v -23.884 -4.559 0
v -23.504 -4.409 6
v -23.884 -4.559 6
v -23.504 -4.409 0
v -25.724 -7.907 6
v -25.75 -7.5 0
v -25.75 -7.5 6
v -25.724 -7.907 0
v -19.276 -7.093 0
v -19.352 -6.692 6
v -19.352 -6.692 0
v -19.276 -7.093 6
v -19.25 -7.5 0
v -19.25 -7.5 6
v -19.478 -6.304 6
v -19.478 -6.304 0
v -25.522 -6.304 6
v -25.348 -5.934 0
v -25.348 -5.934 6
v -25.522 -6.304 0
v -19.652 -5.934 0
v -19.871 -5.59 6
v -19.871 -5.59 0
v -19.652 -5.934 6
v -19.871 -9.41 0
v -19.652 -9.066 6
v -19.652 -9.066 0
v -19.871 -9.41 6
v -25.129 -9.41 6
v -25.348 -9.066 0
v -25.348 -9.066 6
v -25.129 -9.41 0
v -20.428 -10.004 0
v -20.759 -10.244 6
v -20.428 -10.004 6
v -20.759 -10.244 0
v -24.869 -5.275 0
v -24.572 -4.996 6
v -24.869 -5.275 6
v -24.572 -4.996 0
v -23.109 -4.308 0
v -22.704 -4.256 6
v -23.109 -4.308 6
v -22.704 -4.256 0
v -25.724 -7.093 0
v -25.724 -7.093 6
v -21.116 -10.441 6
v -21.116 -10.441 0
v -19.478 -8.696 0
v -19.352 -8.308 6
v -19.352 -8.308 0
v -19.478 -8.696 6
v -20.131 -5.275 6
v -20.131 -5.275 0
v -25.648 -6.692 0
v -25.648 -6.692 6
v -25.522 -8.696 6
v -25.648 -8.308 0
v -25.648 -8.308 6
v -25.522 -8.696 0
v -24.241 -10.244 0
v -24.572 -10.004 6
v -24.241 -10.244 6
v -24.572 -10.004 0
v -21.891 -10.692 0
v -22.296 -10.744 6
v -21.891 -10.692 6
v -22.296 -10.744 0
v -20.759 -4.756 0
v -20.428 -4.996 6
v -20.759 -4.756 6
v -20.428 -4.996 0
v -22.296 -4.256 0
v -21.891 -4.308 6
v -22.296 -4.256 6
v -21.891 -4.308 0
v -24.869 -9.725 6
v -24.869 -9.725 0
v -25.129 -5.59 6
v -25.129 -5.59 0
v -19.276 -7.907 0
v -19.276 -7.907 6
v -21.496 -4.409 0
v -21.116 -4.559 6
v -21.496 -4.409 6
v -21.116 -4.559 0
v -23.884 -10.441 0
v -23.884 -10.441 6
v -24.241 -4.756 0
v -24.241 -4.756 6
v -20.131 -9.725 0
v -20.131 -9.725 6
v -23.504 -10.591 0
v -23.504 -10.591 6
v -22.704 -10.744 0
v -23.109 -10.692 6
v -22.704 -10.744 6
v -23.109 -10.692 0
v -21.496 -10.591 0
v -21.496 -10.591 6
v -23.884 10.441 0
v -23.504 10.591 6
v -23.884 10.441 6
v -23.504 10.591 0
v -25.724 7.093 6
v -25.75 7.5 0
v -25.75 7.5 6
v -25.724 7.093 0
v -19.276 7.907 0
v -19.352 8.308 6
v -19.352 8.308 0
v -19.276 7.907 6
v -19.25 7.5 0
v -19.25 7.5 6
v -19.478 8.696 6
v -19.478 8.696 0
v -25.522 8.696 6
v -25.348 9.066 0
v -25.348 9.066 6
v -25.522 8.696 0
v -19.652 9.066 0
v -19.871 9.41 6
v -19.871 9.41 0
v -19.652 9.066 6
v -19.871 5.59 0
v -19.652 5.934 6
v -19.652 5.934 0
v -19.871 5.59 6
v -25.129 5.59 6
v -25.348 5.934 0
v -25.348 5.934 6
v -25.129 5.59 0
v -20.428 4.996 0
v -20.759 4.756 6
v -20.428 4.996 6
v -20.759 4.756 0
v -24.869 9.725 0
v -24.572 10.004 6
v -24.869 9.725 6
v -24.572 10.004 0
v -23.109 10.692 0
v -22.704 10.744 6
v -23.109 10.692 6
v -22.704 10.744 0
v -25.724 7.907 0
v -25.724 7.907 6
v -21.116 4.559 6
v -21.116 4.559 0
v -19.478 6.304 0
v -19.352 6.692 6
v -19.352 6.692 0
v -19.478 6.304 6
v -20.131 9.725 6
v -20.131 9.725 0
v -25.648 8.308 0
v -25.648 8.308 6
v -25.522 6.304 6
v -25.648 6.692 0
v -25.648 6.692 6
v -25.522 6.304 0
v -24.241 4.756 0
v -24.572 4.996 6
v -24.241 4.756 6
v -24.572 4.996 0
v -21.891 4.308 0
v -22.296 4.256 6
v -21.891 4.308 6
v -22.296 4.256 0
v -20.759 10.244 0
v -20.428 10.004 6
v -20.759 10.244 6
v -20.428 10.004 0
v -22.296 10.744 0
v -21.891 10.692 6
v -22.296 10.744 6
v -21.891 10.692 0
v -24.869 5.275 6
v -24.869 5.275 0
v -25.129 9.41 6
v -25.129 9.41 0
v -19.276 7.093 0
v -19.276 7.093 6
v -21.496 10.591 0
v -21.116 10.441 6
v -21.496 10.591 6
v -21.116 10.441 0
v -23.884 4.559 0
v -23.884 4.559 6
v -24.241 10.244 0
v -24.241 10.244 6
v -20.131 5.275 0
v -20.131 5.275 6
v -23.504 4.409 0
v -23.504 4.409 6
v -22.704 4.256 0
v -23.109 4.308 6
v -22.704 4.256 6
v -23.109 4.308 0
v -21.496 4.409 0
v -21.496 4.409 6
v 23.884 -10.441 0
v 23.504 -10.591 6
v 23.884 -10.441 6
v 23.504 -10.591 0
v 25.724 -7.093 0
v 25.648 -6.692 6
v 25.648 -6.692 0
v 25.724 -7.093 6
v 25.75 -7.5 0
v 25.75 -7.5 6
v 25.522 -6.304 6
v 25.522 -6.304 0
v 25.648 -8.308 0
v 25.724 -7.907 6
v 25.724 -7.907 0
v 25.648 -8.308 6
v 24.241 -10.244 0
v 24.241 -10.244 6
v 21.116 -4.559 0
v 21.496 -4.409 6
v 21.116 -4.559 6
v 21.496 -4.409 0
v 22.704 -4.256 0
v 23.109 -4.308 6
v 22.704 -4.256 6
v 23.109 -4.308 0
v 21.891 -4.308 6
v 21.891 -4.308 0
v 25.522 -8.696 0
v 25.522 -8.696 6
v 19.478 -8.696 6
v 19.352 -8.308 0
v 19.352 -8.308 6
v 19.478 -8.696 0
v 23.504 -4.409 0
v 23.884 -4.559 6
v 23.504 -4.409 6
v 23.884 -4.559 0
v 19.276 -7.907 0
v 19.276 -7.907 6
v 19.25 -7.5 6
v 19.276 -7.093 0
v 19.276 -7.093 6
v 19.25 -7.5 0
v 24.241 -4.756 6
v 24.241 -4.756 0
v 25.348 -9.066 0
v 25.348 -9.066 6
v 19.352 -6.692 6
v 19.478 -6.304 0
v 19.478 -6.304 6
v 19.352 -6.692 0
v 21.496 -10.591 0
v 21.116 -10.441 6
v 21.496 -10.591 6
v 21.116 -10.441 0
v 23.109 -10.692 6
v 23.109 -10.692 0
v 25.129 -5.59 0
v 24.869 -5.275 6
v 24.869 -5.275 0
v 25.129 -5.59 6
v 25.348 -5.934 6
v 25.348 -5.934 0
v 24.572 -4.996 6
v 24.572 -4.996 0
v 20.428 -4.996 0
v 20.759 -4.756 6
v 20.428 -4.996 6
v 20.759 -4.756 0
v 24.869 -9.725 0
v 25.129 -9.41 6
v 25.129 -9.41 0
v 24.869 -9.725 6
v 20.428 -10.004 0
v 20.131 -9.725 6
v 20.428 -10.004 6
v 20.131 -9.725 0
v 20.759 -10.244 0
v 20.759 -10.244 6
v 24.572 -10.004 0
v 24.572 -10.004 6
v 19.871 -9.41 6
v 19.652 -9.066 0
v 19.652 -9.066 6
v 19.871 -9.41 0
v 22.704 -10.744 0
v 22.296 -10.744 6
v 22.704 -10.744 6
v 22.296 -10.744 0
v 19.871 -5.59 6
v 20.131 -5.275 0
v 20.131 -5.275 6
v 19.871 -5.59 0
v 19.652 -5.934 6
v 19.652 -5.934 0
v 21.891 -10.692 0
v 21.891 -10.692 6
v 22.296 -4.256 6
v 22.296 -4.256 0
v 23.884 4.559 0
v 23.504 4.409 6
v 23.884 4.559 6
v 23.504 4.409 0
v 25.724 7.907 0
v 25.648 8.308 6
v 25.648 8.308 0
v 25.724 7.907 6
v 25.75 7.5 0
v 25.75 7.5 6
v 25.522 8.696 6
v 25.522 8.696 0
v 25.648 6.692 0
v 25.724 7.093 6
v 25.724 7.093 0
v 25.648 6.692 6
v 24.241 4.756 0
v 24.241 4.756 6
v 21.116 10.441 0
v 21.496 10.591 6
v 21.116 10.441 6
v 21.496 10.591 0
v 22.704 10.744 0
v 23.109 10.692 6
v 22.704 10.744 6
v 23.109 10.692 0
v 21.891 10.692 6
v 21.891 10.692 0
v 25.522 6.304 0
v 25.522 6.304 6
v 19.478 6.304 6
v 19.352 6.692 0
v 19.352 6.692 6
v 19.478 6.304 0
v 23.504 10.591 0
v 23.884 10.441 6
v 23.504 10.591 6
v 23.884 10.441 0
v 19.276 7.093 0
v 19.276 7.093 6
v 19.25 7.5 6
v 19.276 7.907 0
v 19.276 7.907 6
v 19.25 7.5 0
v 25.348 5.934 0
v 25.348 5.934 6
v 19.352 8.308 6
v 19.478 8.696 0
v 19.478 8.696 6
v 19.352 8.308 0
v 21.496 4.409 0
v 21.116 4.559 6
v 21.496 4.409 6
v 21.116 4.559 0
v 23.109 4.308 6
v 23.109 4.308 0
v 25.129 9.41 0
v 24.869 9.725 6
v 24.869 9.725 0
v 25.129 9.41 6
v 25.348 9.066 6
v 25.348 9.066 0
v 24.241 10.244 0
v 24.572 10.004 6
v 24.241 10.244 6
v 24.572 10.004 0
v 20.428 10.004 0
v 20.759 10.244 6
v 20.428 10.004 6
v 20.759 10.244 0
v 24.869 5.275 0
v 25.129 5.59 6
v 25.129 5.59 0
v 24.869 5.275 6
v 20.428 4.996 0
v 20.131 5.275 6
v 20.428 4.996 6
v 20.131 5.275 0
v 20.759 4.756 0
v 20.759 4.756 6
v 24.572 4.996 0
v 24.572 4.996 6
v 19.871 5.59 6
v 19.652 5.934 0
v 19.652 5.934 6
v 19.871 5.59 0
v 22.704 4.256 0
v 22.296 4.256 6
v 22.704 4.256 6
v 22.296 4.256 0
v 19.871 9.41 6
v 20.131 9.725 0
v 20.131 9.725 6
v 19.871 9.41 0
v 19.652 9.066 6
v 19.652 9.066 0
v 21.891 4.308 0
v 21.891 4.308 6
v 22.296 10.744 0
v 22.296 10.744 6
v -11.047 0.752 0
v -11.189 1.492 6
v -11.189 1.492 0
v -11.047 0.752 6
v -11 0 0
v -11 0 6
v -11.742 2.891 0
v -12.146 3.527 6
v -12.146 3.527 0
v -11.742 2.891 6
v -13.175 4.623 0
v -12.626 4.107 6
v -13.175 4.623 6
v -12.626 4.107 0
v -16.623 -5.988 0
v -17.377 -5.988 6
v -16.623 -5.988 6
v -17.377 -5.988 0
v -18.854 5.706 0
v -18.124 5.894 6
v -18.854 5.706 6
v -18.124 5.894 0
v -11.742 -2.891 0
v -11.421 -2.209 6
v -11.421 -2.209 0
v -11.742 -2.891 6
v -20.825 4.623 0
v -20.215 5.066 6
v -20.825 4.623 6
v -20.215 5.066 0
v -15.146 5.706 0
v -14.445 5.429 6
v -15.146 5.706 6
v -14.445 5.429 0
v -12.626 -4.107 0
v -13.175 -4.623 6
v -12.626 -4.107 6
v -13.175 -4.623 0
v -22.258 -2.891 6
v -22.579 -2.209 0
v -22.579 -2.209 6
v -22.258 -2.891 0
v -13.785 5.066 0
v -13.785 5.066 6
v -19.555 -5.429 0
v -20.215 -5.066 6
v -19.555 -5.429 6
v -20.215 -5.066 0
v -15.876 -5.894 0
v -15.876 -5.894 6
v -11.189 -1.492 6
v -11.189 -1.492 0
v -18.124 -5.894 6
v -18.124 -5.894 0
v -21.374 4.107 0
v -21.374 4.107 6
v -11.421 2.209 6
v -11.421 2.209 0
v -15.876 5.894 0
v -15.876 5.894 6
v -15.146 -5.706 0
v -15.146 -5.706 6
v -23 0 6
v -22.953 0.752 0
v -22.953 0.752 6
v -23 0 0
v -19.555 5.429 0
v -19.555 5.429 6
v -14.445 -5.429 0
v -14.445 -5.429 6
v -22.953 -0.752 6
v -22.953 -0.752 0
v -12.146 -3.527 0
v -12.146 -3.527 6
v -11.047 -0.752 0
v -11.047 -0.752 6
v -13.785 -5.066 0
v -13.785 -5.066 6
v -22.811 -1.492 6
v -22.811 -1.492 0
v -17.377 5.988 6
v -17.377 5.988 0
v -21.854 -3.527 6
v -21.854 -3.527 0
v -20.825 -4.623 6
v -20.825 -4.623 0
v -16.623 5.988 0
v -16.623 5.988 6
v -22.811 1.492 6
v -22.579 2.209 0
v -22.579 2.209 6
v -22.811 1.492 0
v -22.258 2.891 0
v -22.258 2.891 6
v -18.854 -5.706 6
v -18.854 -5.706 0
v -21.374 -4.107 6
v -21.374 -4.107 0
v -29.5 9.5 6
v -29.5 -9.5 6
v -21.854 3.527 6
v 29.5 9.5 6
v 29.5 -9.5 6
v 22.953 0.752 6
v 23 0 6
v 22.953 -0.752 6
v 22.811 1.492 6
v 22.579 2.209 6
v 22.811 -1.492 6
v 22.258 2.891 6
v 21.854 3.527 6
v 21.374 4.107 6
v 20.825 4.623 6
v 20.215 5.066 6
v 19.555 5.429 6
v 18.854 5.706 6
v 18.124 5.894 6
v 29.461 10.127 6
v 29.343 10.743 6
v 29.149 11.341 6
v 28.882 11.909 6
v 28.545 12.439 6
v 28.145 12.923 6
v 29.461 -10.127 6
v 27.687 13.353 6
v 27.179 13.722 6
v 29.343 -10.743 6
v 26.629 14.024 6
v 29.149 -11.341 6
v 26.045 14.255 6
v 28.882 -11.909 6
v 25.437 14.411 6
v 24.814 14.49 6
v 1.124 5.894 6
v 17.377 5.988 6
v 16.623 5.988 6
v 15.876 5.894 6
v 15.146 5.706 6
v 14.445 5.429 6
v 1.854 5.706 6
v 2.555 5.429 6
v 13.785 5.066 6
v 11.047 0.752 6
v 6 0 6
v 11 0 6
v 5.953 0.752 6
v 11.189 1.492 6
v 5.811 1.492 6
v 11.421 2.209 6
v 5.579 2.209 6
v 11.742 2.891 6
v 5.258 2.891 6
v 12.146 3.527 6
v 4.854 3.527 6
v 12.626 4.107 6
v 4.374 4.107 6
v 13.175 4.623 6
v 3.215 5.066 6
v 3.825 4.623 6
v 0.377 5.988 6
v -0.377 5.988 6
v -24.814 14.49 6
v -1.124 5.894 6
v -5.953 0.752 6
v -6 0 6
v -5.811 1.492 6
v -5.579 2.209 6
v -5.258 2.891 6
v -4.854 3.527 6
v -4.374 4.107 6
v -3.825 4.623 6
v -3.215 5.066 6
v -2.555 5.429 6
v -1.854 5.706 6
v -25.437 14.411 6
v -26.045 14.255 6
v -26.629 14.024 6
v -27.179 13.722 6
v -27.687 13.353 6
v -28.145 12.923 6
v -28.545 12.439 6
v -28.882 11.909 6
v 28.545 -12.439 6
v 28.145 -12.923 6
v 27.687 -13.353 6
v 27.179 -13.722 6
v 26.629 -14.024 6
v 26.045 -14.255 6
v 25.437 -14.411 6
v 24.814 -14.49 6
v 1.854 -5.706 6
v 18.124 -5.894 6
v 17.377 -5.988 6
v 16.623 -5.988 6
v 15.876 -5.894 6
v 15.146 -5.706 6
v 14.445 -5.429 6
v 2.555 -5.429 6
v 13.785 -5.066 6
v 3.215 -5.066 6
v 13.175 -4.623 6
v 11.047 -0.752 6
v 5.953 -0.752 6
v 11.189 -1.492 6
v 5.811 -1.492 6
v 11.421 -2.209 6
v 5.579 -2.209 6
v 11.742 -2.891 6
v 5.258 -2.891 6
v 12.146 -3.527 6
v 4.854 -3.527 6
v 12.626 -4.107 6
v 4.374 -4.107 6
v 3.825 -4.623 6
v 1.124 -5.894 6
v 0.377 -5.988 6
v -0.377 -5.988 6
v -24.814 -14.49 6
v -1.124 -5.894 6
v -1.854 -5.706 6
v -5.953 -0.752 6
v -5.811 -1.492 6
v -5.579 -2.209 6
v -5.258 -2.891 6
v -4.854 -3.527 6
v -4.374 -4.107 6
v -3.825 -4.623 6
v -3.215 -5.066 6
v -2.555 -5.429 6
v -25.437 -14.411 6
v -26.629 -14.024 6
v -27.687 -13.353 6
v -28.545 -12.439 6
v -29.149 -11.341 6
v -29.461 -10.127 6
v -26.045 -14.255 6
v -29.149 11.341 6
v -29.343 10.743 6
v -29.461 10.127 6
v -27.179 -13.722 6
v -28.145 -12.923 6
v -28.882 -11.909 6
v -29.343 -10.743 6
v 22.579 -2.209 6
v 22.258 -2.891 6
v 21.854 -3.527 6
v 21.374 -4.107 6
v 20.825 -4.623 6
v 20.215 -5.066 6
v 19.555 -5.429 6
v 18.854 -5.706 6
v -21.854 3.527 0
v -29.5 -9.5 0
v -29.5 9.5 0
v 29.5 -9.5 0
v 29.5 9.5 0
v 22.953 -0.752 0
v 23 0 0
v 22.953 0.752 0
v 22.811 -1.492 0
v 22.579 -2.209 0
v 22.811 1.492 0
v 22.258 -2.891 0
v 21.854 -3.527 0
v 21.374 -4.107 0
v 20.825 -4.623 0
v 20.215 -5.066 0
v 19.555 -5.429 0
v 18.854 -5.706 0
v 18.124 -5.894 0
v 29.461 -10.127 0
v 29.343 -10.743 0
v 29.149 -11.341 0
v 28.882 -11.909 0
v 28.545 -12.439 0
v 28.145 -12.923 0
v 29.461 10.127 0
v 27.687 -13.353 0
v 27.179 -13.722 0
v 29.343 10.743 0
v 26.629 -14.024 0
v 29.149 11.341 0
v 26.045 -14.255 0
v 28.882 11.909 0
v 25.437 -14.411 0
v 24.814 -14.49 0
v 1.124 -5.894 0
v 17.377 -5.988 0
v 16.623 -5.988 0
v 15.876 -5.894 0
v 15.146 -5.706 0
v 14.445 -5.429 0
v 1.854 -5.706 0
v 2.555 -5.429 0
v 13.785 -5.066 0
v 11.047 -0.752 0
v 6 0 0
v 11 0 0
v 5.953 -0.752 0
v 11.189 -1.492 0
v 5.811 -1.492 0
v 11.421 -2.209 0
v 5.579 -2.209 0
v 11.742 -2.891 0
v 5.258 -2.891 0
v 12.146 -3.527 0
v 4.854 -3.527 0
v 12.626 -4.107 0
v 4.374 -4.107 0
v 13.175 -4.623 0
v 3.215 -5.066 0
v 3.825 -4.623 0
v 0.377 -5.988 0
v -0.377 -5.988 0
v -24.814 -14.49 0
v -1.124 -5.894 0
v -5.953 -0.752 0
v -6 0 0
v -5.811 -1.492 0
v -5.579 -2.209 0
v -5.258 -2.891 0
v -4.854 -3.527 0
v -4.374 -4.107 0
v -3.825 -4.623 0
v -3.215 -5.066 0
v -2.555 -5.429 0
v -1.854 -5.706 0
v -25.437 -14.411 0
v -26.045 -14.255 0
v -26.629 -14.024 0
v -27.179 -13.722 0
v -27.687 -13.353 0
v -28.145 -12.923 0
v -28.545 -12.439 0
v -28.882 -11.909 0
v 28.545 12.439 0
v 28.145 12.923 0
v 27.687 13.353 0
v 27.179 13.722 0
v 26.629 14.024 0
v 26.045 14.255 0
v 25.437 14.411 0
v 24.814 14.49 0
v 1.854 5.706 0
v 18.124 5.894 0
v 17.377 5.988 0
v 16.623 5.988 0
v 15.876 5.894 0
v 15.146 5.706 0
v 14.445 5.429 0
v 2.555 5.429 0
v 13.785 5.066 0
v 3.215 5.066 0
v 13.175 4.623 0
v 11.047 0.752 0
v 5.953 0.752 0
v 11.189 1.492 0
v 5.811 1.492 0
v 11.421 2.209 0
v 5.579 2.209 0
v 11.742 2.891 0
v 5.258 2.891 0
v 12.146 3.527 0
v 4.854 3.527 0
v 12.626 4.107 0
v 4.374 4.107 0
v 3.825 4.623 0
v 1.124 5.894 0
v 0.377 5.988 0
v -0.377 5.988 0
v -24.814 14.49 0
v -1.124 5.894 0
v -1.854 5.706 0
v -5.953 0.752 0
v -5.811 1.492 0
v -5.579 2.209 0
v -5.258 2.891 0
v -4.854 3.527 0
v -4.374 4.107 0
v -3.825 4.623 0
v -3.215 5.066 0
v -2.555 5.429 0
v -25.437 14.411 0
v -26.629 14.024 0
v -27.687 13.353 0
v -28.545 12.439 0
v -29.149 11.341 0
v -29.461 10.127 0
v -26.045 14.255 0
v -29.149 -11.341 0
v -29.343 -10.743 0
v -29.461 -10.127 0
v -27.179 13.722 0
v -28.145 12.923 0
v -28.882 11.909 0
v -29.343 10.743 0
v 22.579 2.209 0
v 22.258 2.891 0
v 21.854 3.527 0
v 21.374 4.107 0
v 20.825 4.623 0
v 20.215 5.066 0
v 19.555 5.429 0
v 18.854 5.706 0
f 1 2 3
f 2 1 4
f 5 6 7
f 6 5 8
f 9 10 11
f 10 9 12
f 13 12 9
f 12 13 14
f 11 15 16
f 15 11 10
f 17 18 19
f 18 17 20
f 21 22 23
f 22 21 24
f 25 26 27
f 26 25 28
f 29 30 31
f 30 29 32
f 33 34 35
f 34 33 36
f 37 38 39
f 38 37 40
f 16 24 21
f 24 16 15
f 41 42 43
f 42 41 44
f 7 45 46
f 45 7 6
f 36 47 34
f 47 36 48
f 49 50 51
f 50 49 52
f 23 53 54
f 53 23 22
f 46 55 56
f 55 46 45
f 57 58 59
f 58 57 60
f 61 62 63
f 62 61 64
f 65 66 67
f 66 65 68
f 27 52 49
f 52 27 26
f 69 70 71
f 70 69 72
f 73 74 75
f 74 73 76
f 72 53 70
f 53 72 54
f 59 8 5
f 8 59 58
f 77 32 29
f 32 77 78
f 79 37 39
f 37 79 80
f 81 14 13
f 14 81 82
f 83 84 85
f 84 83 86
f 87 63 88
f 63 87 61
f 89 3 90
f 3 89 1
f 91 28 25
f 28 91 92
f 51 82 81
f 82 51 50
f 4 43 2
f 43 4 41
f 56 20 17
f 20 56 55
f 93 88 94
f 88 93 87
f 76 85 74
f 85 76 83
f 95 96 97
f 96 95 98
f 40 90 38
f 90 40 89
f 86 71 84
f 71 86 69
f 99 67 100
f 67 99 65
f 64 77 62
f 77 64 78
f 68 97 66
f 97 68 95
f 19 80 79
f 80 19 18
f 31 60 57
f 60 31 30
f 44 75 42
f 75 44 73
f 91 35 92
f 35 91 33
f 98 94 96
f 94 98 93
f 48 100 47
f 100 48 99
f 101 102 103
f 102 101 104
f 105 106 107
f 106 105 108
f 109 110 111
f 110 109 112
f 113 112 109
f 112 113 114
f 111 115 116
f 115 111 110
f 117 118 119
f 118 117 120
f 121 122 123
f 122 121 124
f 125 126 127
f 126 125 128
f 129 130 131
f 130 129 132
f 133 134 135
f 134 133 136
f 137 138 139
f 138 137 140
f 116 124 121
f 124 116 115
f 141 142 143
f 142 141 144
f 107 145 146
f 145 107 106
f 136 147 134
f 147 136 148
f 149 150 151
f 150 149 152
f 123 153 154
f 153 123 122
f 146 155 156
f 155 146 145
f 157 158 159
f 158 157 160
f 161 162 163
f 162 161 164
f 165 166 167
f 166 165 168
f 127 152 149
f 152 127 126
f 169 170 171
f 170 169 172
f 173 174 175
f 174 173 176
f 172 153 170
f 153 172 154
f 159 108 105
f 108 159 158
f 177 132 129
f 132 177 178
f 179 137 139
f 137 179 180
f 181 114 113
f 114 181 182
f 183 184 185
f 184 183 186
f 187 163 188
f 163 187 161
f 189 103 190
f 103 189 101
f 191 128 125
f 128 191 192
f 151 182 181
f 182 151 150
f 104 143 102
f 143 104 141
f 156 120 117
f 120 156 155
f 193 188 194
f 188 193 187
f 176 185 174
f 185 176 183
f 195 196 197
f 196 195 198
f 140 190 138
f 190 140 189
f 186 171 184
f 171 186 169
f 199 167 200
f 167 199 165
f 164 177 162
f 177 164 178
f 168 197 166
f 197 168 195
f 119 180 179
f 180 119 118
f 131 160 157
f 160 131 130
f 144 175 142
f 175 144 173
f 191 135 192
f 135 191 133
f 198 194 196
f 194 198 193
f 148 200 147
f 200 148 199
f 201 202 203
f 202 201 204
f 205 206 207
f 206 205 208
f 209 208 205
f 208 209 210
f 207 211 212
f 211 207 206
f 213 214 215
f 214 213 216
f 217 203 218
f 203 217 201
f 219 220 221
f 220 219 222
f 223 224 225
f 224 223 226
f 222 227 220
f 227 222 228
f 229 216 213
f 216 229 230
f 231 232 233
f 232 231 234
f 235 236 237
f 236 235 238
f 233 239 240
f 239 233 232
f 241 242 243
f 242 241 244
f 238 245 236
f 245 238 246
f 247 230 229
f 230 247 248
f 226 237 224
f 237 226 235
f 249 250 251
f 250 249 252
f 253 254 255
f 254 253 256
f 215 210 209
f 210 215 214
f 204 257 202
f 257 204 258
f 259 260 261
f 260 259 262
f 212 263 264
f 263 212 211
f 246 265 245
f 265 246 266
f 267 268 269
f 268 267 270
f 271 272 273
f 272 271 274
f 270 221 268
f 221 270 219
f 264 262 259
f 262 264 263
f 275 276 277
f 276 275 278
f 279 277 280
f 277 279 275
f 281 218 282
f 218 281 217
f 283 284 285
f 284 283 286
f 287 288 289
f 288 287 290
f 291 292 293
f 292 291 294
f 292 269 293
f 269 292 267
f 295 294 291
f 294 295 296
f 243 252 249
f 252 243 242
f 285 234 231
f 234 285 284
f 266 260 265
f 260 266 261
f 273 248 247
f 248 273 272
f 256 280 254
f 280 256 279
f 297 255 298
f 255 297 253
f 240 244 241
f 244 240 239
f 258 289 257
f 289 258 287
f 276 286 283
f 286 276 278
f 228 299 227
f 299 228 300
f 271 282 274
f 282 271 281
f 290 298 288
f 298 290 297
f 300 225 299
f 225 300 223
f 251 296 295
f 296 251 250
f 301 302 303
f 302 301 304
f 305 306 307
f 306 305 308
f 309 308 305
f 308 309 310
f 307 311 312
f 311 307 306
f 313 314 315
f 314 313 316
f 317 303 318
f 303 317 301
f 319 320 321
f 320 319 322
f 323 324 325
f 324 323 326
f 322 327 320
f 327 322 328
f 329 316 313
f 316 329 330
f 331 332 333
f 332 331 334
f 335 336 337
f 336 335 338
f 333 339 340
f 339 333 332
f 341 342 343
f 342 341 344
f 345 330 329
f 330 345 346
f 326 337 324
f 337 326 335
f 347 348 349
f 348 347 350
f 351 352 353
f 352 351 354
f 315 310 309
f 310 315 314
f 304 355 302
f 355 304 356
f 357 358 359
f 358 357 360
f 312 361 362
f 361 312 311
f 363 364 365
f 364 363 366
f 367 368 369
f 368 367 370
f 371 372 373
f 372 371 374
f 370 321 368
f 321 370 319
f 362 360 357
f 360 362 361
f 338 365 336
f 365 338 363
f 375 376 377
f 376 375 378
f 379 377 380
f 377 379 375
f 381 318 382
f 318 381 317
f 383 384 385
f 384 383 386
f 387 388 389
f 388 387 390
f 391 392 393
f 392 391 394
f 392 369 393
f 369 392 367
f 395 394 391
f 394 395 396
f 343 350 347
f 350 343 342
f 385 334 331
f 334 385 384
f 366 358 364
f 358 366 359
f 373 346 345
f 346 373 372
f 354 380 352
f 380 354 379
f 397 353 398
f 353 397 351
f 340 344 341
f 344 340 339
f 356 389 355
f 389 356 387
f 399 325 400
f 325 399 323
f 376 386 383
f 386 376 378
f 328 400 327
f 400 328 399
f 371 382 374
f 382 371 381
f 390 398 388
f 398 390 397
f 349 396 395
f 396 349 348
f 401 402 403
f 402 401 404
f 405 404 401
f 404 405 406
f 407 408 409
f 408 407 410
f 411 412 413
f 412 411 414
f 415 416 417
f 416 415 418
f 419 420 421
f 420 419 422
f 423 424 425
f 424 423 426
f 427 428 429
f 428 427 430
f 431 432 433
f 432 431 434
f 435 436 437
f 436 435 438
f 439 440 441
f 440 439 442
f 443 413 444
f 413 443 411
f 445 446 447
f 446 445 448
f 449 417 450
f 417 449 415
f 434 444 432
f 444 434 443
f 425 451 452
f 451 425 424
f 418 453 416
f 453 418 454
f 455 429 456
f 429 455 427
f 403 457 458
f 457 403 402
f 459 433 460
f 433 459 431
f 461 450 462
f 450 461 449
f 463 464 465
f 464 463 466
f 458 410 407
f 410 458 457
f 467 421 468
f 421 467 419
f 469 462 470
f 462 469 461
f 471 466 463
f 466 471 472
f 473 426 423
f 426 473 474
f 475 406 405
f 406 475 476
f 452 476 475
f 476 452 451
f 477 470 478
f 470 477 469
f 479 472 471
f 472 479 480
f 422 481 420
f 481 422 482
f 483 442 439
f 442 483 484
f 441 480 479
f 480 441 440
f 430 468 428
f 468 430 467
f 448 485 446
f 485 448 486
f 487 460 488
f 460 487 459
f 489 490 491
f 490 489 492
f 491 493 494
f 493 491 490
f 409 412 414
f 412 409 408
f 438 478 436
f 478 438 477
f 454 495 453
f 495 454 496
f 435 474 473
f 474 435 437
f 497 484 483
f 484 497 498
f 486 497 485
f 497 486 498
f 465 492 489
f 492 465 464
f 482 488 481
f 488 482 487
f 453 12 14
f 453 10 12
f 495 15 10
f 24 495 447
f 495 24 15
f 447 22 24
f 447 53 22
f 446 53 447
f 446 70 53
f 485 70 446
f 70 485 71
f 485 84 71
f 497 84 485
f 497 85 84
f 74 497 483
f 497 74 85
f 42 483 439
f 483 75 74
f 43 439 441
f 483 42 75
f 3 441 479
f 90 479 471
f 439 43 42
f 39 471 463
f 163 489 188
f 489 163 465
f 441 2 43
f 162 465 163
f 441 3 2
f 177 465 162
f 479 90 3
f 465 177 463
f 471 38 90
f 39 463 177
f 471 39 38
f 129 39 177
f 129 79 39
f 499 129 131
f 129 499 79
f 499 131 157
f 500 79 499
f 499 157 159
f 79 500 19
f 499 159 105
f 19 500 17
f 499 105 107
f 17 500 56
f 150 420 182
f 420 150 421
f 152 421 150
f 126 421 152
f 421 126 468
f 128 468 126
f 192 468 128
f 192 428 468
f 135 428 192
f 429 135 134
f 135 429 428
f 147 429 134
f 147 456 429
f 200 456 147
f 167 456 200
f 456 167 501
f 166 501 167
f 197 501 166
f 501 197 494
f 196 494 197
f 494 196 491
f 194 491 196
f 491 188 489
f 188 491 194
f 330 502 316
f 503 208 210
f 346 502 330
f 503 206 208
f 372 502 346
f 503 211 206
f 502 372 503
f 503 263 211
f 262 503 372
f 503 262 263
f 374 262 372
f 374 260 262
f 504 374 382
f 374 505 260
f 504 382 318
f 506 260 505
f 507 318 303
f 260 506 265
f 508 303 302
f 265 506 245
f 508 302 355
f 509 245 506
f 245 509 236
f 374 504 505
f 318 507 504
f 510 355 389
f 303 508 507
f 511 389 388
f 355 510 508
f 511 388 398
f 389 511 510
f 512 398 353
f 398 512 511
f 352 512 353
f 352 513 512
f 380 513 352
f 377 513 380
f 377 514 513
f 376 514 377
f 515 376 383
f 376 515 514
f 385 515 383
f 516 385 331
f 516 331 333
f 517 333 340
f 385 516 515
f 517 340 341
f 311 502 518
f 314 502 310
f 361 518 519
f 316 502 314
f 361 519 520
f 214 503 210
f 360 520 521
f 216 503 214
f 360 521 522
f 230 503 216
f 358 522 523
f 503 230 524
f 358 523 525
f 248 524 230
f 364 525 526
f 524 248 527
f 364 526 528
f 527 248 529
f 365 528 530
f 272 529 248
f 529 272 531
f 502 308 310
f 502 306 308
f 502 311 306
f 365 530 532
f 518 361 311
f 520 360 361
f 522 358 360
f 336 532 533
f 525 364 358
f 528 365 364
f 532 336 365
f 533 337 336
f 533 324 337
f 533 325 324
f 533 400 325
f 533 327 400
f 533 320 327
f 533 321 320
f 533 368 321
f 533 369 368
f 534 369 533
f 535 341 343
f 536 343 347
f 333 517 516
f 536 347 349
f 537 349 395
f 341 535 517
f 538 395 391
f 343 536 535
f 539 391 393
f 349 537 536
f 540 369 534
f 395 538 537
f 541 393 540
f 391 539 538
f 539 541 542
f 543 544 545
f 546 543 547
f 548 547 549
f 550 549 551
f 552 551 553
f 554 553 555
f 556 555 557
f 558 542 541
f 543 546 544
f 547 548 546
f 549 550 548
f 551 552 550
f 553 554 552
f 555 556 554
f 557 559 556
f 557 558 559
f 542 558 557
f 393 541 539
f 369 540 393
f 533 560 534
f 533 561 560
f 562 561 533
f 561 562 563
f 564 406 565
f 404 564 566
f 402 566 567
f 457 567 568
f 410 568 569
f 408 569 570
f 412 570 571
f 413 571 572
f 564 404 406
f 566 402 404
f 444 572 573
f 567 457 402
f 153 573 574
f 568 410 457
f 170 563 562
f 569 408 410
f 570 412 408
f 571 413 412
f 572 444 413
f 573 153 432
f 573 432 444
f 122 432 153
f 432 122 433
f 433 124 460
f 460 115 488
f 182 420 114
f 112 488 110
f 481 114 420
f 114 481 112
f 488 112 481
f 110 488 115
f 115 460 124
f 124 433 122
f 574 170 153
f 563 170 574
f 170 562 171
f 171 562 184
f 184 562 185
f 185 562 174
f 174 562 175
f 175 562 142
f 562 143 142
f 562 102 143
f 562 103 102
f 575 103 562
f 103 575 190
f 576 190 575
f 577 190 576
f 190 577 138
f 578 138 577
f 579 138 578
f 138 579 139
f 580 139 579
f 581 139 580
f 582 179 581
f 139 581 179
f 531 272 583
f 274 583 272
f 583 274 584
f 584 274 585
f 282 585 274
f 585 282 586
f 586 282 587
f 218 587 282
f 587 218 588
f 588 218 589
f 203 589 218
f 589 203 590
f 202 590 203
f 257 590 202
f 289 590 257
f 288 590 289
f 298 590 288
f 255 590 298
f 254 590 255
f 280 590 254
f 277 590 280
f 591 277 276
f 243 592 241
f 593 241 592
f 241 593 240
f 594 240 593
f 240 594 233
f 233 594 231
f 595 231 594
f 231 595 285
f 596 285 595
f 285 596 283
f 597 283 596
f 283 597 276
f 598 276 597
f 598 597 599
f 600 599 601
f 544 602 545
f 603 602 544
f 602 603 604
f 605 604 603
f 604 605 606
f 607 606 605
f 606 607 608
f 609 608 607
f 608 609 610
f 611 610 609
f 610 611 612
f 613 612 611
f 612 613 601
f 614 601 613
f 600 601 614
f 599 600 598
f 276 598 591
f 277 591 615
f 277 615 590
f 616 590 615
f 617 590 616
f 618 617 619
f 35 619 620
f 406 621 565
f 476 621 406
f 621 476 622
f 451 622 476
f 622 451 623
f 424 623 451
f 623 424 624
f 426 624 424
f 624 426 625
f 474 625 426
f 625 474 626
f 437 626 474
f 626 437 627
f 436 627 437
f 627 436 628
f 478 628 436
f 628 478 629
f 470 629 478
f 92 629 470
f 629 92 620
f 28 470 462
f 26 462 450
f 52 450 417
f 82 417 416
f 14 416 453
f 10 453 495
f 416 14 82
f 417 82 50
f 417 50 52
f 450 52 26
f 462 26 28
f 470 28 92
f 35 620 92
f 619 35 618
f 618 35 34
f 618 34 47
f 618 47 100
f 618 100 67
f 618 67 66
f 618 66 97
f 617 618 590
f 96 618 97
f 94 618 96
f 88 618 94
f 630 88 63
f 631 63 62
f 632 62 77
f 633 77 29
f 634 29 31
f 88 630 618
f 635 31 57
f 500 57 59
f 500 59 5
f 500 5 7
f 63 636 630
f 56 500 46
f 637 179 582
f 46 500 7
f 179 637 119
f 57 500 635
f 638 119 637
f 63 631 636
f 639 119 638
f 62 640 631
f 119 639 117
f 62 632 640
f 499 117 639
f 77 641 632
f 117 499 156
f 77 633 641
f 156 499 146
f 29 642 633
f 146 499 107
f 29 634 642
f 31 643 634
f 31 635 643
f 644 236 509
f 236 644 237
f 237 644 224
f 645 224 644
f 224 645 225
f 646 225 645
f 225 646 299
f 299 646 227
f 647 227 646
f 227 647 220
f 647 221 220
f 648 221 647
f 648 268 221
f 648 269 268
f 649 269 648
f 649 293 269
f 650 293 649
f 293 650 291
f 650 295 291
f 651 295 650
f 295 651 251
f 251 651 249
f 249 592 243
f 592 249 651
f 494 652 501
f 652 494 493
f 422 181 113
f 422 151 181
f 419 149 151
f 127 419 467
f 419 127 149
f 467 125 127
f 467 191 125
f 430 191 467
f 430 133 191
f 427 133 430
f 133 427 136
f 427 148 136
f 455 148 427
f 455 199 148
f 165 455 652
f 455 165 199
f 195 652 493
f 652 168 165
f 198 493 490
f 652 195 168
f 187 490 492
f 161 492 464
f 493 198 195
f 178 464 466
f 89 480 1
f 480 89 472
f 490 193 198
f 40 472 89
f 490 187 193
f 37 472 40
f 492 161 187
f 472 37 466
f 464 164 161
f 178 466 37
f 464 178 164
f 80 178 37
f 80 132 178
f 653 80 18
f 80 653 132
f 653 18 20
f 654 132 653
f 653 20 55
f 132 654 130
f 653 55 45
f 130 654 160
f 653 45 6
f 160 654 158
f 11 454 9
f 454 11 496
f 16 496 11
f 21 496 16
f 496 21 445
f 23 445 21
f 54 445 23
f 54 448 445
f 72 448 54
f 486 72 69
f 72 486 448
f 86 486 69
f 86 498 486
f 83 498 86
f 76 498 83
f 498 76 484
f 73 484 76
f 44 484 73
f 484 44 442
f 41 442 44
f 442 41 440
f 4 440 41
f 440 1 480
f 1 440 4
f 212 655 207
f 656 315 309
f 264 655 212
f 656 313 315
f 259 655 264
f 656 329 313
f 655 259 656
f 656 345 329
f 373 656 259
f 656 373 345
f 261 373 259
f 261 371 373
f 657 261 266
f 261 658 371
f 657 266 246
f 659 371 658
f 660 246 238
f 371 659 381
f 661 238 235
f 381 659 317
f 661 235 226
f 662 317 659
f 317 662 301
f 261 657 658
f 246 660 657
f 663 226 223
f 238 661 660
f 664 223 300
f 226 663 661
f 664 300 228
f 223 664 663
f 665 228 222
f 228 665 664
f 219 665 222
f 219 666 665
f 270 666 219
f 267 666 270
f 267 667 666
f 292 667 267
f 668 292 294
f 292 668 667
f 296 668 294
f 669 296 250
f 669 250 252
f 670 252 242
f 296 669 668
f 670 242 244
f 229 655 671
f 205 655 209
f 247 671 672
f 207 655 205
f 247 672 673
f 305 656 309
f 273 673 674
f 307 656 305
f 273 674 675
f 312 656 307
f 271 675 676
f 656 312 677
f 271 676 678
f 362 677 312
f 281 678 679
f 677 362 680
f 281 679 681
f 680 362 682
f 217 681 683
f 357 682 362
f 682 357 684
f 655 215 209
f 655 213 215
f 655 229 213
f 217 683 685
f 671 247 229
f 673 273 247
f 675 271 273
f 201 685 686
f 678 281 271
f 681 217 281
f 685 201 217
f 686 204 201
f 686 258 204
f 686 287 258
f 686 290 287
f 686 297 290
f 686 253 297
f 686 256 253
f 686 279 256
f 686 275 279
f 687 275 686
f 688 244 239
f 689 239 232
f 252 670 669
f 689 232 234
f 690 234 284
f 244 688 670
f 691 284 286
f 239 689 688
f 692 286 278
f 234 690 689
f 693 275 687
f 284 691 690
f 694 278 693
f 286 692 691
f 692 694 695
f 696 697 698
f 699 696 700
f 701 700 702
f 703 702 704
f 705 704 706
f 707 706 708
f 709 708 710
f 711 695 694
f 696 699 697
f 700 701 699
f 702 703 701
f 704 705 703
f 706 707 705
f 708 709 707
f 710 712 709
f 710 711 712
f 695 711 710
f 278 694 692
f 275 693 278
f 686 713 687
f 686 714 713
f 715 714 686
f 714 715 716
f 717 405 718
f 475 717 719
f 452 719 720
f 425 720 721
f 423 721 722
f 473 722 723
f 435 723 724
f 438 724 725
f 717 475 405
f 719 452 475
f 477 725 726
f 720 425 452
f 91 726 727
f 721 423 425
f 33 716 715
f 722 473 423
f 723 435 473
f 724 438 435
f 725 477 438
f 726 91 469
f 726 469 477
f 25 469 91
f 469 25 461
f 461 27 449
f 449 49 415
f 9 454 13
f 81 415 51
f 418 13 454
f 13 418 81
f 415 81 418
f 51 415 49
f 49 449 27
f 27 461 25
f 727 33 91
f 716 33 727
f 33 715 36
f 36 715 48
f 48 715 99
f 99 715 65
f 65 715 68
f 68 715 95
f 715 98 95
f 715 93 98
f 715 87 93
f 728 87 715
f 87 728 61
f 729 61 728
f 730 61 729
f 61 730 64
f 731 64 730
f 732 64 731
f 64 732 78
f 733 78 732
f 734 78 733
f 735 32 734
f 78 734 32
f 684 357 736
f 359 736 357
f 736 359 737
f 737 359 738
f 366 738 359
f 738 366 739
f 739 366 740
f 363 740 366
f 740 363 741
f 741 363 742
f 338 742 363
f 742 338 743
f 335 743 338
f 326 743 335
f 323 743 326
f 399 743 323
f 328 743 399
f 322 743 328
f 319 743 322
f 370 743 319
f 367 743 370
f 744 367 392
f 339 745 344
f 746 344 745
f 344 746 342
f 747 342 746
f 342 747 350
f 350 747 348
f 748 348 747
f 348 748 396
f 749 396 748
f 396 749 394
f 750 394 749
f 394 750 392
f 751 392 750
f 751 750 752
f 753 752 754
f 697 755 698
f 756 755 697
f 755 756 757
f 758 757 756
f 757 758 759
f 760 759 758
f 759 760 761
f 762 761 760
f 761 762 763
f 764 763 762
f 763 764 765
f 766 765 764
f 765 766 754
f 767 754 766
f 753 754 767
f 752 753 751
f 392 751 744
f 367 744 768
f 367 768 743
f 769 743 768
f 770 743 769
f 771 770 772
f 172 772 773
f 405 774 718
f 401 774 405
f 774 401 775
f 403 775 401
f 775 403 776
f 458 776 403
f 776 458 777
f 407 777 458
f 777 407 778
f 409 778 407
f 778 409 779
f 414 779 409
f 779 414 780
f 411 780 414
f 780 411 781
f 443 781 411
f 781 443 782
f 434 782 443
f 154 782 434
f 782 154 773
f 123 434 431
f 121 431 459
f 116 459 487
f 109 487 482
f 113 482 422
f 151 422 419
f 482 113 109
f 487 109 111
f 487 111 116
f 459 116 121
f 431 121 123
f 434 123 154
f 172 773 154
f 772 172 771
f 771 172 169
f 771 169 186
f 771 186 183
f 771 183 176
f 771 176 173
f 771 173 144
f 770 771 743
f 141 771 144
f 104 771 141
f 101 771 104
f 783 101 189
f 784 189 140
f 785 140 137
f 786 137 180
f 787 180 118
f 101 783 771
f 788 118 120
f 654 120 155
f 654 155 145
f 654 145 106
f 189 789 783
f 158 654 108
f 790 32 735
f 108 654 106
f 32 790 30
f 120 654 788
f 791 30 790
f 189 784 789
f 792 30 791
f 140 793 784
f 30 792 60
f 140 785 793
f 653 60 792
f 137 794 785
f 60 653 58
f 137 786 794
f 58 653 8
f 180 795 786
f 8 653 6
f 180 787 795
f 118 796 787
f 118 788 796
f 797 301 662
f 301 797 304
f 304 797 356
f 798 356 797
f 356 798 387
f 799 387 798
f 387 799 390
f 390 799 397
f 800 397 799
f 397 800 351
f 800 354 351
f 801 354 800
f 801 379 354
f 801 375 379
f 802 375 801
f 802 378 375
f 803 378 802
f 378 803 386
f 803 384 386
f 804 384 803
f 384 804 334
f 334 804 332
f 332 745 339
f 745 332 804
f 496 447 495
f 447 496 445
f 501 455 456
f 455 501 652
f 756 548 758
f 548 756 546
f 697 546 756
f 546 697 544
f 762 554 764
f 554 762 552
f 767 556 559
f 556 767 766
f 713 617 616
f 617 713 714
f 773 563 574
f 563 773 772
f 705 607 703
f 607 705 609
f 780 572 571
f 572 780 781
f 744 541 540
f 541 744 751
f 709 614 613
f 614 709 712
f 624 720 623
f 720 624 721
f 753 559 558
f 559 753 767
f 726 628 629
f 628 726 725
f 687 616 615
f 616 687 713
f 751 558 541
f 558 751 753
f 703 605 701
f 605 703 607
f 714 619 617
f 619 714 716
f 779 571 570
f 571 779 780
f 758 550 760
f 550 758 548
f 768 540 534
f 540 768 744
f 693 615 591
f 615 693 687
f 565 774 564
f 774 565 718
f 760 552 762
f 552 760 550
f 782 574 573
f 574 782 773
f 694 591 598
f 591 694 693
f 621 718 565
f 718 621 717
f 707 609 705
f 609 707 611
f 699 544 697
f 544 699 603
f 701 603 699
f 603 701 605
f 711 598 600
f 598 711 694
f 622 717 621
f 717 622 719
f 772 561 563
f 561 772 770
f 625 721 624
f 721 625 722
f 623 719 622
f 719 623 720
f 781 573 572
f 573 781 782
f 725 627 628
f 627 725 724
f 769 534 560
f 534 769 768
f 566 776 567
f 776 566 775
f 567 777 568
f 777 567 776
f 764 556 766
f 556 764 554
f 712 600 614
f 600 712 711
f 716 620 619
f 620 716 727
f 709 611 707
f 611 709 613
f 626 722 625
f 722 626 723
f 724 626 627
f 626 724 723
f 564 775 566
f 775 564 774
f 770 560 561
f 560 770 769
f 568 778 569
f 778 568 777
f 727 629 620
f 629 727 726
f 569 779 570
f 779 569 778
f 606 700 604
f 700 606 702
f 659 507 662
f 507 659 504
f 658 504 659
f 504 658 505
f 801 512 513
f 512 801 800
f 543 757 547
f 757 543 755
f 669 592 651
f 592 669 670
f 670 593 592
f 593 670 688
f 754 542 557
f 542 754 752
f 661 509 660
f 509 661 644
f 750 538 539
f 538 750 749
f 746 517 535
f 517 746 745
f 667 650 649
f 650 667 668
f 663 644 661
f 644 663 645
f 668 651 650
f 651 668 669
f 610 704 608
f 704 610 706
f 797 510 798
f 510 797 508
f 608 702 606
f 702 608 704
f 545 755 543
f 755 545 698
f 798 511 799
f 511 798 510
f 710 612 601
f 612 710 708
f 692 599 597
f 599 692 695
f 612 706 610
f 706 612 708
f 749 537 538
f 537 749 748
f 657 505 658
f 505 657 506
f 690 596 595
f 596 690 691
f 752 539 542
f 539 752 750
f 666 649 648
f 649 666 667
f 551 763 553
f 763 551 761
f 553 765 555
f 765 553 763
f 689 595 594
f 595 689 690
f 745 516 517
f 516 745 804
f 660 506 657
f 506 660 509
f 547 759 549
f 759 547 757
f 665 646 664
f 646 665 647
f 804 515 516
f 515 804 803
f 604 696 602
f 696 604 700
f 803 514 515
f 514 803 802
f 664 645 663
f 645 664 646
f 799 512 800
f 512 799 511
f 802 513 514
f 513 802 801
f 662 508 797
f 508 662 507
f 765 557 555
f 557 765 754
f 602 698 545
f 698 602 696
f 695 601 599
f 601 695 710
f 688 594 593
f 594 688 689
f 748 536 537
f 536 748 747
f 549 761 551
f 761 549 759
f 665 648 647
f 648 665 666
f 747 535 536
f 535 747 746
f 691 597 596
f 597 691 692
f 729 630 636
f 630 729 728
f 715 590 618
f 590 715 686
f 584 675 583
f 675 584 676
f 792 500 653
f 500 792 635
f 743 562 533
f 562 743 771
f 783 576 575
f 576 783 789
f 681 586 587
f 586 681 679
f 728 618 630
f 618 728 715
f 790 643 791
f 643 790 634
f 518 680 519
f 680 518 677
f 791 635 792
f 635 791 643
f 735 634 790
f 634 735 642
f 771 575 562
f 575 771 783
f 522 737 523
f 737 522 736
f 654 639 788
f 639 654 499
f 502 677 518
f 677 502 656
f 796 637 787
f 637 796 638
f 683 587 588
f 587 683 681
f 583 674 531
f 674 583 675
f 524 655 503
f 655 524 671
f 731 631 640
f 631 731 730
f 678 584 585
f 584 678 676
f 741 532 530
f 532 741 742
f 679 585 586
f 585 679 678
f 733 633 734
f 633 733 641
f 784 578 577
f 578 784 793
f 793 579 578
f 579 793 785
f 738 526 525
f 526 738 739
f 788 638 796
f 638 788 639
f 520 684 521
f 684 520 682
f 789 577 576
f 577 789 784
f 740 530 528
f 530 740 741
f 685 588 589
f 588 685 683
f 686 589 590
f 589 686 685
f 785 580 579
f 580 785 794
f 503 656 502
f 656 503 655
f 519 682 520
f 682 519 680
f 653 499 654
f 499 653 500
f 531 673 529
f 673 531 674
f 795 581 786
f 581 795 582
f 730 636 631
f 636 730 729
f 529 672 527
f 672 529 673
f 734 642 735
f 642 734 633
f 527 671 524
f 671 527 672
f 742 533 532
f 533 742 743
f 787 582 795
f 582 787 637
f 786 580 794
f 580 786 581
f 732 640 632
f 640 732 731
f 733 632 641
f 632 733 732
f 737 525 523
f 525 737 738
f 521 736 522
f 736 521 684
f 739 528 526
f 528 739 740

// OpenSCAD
$fn = 50;


difference() {
	union() {
		hull() {
			translate(v = [-24.5000000000, 9.5000000000, 0]) {
				cylinder(h = 6, r = 5);
			}
			translate(v = [24.5000000000, 9.5000000000, 0]) {
				cylinder(h = 6, r = 5);
			}
			translate(v = [-24.5000000000, -9.5000000000, 0]) {
				cylinder(h = 6, r = 5);
			}
			translate(v = [24.5000000000, -9.5000000000, 0]) {
				cylinder(h = 6, r = 5);
			}
		}
	}
	union() {
		#translate(v = [-22.5000000000, -7.5000000000, -100.0000000000]) {
			cylinder(h = 200, r = 3.2500000000);
		}
		#translate(v = [-22.5000000000, 7.5000000000, -100.0000000000]) {
			cylinder(h = 200, r = 3.2500000000);
		}
		#translate(v = [22.5000000000, -7.5000000000, -100.0000000000]) {
			cylinder(h = 200, r = 3.2500000000);
		}
		#translate(v = [22.5000000000, 7.5000000000, -100.0000000000]) {
			cylinder(h = 200, r = 3.2500000000);
		}
		#translate(v = [-17.0000000000, 0, 0]) {
			cylinder(h = 6, r = 6.0000000000);
		}
		#cylinder(h = 6, r = 6.0000000000);
		#translate(v = [17.0000000000, 0, 0]) {
			cylinder(h = 6, r = 6.0000000000);
		}
	}
}
